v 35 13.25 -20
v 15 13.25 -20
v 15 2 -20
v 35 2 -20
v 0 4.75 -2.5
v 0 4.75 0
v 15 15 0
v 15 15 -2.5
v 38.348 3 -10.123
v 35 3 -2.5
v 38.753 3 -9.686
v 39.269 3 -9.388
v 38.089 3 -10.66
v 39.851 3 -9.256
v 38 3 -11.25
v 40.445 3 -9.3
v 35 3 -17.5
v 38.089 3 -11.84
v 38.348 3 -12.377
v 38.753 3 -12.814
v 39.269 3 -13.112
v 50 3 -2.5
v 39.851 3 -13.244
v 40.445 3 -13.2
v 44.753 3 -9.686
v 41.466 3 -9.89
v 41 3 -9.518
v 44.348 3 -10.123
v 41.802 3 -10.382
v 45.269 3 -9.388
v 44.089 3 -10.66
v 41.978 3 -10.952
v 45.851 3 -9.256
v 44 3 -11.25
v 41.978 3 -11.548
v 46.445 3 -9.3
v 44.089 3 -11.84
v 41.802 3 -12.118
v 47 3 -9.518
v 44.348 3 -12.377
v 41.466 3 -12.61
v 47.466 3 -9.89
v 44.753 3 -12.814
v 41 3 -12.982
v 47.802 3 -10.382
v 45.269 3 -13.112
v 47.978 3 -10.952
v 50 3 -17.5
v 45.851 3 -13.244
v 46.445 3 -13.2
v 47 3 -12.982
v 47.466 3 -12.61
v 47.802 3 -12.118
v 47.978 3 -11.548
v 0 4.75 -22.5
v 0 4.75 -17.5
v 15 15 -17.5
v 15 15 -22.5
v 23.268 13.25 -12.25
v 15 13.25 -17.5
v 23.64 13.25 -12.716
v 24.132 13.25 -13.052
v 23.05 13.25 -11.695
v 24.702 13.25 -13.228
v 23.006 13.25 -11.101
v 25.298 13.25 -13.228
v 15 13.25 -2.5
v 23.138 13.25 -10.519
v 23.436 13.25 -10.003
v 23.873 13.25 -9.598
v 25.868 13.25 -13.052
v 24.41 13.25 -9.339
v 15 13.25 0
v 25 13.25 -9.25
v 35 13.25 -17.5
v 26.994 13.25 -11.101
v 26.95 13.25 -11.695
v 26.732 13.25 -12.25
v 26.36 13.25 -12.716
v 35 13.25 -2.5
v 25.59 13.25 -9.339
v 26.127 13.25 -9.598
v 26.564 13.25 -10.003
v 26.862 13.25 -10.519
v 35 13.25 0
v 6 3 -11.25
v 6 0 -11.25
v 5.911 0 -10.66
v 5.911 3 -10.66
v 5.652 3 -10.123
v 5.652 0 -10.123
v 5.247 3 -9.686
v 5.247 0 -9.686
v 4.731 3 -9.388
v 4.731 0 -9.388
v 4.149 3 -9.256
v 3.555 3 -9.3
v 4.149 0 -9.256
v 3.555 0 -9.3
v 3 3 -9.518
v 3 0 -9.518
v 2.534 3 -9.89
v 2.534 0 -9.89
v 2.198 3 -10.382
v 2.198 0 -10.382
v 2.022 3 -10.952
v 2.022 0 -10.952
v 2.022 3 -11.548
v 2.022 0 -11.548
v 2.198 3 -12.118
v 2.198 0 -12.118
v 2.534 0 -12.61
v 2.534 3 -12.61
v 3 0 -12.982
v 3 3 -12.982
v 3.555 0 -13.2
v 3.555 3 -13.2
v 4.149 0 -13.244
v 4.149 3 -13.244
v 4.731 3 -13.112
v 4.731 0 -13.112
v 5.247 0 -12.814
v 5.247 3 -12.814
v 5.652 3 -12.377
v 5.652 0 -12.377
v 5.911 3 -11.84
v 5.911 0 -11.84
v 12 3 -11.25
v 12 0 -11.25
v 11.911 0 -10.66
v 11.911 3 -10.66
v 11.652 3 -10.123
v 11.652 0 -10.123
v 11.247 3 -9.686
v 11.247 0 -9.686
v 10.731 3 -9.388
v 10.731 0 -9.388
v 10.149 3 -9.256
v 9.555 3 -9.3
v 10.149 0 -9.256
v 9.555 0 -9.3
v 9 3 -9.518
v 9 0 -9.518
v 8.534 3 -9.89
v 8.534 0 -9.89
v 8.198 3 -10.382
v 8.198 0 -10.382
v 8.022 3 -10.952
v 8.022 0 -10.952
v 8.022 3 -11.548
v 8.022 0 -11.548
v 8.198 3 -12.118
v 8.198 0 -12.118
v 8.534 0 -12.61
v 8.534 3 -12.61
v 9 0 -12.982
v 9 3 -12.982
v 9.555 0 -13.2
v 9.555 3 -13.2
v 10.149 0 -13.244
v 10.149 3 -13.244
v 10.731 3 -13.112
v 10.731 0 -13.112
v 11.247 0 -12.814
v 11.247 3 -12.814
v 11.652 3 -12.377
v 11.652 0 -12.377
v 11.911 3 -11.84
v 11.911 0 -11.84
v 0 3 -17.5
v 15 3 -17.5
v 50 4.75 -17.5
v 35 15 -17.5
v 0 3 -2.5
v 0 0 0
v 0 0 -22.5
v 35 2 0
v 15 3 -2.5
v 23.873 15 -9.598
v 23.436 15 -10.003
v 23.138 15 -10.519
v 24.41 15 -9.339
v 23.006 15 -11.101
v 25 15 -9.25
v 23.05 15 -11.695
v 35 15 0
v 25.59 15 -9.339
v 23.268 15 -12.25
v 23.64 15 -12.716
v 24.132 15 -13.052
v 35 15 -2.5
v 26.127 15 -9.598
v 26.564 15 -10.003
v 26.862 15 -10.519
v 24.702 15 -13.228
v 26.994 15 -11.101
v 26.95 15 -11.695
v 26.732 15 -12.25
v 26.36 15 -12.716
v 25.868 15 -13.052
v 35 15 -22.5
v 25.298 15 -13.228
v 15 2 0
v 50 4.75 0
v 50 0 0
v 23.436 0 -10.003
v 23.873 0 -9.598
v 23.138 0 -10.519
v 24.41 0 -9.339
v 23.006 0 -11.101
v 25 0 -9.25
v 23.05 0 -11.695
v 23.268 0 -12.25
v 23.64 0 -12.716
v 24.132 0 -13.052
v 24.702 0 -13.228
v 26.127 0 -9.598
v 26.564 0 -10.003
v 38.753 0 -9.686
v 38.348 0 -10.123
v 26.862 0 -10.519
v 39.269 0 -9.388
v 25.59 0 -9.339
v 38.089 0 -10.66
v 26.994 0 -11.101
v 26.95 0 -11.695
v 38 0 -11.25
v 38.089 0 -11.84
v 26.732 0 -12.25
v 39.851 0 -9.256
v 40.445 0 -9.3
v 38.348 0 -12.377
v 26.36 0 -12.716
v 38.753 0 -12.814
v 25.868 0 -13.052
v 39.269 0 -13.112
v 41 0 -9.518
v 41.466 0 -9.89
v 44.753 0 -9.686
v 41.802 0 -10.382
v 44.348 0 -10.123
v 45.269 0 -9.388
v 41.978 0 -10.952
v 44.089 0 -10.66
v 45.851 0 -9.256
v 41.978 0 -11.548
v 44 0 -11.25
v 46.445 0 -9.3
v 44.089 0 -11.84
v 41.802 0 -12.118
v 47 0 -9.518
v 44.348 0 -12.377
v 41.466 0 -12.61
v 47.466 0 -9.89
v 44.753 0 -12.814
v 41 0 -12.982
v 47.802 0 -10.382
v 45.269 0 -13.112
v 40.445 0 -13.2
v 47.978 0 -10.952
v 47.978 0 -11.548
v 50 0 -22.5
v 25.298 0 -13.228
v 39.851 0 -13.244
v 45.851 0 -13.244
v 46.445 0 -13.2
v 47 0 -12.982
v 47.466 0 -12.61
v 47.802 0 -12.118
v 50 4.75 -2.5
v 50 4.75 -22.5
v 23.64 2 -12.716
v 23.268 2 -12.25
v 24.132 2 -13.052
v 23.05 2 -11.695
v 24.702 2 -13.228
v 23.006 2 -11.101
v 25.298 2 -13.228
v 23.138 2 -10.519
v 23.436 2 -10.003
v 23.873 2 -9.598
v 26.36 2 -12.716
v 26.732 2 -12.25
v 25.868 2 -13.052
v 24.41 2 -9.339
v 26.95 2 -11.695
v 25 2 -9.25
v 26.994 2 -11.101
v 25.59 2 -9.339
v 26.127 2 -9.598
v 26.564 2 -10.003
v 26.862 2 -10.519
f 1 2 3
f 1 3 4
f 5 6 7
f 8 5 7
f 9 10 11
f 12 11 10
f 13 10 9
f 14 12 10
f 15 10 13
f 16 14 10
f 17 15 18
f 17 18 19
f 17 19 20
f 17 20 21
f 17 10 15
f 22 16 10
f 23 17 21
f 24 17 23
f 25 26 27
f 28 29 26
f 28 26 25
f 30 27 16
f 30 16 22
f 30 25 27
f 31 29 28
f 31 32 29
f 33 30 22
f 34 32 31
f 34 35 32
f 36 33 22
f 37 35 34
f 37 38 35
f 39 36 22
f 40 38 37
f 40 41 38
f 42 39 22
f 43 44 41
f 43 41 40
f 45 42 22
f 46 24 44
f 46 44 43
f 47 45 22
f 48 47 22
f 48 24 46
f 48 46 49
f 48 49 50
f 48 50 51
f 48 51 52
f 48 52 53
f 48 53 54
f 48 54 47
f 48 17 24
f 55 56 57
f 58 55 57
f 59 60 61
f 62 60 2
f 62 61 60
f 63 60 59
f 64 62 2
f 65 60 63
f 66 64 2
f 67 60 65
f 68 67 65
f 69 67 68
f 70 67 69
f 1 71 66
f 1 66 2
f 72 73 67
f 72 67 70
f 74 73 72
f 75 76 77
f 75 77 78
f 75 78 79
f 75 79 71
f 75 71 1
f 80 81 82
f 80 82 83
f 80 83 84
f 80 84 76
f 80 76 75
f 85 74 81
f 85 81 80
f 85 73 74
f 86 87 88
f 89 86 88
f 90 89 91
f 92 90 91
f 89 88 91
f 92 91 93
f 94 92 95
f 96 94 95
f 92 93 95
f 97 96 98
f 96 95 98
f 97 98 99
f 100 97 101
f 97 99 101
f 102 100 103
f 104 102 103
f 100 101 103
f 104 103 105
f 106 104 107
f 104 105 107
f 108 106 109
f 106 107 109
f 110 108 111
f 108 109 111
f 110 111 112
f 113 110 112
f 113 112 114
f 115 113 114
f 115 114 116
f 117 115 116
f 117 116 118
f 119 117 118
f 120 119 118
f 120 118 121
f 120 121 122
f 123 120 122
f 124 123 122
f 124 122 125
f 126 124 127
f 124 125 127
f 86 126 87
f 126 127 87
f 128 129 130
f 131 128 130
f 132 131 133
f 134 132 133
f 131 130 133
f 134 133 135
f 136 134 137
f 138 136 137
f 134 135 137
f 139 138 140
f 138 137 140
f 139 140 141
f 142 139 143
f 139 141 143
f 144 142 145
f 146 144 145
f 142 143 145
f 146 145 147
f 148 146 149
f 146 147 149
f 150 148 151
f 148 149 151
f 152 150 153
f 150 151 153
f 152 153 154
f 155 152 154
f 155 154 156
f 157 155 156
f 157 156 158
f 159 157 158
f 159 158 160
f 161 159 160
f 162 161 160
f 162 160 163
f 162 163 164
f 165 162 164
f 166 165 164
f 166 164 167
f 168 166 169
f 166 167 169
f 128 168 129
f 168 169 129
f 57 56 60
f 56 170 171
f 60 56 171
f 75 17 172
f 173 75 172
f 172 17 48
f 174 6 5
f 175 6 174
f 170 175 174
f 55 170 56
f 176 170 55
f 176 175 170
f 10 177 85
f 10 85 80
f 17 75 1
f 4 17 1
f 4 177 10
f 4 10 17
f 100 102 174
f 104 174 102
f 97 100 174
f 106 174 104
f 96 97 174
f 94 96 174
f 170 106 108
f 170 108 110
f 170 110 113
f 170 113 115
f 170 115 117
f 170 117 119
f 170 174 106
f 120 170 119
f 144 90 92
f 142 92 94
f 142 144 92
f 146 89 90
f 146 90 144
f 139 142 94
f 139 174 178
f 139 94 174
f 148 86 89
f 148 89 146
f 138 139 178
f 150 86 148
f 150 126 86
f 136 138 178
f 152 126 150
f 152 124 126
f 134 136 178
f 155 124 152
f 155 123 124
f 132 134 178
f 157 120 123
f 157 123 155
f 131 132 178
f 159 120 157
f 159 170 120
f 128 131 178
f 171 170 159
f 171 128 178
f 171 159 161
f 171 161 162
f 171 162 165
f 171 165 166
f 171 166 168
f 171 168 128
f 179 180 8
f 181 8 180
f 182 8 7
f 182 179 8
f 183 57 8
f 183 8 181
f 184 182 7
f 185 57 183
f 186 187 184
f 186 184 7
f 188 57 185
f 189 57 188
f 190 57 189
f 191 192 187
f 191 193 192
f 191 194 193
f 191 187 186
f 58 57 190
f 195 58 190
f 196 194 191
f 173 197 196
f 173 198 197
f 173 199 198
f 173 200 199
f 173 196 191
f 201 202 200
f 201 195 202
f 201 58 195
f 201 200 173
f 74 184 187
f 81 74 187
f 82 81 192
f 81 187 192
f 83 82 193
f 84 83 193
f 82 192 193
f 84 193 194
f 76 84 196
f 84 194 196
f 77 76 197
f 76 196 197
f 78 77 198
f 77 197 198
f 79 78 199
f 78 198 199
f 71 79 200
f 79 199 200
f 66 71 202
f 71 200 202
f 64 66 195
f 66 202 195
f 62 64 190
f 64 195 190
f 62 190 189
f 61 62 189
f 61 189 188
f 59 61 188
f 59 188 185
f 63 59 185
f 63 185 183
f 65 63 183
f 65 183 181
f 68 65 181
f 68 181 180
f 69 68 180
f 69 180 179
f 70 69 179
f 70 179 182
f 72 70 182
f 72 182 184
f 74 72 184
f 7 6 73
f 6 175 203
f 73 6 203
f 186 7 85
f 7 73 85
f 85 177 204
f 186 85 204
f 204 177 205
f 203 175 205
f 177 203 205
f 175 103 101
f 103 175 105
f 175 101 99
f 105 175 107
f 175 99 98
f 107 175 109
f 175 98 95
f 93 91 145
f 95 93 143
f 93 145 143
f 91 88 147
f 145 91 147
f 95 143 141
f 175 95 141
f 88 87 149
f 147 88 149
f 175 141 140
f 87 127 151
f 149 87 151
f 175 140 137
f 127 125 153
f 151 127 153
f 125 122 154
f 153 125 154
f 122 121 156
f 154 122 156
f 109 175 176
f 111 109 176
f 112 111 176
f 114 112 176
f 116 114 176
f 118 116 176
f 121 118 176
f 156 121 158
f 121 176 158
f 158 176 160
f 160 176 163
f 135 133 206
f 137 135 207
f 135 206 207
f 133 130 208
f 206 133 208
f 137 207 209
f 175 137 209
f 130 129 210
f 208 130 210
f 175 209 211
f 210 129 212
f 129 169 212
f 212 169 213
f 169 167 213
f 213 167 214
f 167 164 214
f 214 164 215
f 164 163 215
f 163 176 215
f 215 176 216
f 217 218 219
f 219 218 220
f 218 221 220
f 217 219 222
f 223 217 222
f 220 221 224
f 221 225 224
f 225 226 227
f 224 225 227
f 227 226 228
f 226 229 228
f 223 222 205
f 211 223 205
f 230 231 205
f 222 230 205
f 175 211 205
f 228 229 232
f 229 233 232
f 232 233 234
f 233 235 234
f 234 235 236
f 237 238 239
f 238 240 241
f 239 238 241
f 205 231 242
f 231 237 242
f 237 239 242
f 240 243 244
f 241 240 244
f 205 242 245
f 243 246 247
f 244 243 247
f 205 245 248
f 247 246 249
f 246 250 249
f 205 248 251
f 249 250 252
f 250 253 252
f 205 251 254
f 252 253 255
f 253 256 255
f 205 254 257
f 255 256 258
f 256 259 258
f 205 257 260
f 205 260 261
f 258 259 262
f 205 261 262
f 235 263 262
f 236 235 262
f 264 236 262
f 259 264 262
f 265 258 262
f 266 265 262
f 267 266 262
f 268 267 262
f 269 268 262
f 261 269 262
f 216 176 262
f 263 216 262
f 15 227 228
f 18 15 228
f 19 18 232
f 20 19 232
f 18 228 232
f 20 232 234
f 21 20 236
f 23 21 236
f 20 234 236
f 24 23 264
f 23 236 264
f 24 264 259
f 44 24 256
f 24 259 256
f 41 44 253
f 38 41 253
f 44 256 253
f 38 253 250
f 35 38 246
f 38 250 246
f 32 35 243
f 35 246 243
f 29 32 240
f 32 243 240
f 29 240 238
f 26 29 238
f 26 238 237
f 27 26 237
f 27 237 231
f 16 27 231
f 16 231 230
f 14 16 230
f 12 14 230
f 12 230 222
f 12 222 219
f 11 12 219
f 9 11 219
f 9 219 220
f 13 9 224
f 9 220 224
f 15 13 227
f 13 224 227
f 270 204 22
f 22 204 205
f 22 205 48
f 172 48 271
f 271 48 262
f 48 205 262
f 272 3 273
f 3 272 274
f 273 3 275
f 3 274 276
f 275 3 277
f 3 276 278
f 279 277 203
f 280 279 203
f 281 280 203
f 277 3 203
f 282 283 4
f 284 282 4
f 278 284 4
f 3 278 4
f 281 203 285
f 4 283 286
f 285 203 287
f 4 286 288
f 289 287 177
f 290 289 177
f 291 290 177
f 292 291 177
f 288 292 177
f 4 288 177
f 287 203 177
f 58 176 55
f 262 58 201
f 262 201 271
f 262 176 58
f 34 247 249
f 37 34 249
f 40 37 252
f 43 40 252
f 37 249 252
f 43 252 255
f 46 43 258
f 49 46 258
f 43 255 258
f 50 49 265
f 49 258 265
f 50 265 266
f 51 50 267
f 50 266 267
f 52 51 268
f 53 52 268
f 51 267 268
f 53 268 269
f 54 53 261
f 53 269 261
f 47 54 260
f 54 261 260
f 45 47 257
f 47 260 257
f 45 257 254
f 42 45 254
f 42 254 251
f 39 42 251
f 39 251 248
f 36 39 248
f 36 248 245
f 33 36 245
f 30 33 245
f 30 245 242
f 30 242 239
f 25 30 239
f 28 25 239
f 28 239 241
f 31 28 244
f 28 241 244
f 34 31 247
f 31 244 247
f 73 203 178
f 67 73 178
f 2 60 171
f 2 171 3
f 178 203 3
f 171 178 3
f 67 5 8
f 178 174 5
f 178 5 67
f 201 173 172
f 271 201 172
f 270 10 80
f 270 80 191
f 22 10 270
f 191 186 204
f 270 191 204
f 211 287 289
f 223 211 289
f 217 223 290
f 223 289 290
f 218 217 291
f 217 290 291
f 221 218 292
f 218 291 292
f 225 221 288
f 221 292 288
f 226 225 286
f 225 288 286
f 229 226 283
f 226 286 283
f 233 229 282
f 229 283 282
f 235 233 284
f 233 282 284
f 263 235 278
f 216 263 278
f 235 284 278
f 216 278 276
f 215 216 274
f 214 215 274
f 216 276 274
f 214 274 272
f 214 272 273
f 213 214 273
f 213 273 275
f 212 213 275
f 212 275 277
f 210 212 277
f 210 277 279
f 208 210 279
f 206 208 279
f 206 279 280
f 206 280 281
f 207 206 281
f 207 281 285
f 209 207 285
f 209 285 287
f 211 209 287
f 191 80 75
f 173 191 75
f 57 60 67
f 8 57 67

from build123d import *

# Parameters (mm, degrees)
SKETCH1_W           = 20
SKETCH1_H           = 11.25
BOSS_EXTRUDE1_DEPTH = 3
SKETCH1_3_W         = 20
SKETCH1_3_H         = 11.25
BOSS_EXTRUDE2_DEPTH = 15
SKETCH2_W           = 20
SKETCH2_H           = 11.25
CUT_EXTRUDE1_DEPTH  = 20
BOSS_EXTRUDE3_REACH = 58.127
SKETCH3_W           = 15
SKETCH3_H           = 5
SKETCH3_H_2         = 2.5
CUT_EXTRUDE2_REACH  = 58.844
SKETCH5_R           = 2
CUT_EXTRUDE3_DEPTH  = 57.844085005


with BuildPart() as part:
    # Sketch1 → Boss-Extrude1 (new body)
    with BuildSketch(Plane(origin=(0, 0, 0), x_dir=(1, 0, 0), z_dir=(0, 1, 0))):
        with BuildLine():
            Line((15, 11.25), (15, 22.5))
            Line((15, 22.5), (0, 22.5))
            Line((0, 22.5), (0, 11.25))
            Line((0, 11.25), (2, 11.25))
            ThreePointArc((2, 11.25), (4, 13.25), (6, 11.25))
            Line((6, 11.25), (8, 11.25))
            ThreePointArc((8, 11.25), (10, 13.25), (12, 11.25))
            Line((12, 11.25), (15, 11.25))
        make_face()
        with BuildLine():
            Line((0, 0), (15, 0))
            Line((15, 0), (15, 11.25))
            Line((15, 11.25), (12, 11.25))
            ThreePointArc((12, 11.25), (10, 9.25), (8, 11.25))
            Line((8, 11.25), (6, 11.25))
            ThreePointArc((6, 11.25), (4, 9.25), (2, 11.25))
            Line((2, 11.25), (0, 11.25))
            Line((0, 11.25), (0, 0))
        make_face()
        with Locations((25, 5.625)):
            Rectangle(SKETCH1_W, SKETCH1_H)
        with Locations((25, 16.875)):
            Rectangle(SKETCH1_W, SKETCH1_H)
        with BuildLine():
            Line((50, 11.25), (48, 11.25))
            ThreePointArc((48, 11.25), (46, 9.25), (44, 11.25))
            Line((44, 11.25), (42, 11.25))
            ThreePointArc((42, 11.25), (40, 9.25), (38, 11.25))
            Line((38, 11.25), (35, 11.25))
            Line((35, 11.25), (35, 0))
            Line((35, 0), (50, 0))
            Line((50, 0), (50, 11.25))
        make_face()
        with BuildLine():
            ThreePointArc((44, 11.25), (46, 13.25), (48, 11.25))
            Line((48, 11.25), (50, 11.25))
            Line((50, 11.25), (50, 22.5))
            Line((50, 22.5), (35, 22.5))
            Line((35, 22.5), (35, 11.25))
            Line((35, 11.25), (38, 11.25))
            ThreePointArc((38, 11.25), (40, 13.25), (42, 11.25))
            Line((42, 11.25), (44, 11.25))
        make_face()
    extrude(amount=BOSS_EXTRUDE1_DEPTH)

    # Sketch1<3> → Boss-Extrude2 (add)
    with BuildSketch(Plane(origin=(0, 0, 0), x_dir=(1, 0, 0), z_dir=(0, 1, 0))):
        with Locations((25, 5.625)):
            Rectangle(SKETCH1_3_W, SKETCH1_3_H)
        with Locations((25, 16.875)):
            Rectangle(SKETCH1_3_W, SKETCH1_3_H)
    extrude(amount=BOSS_EXTRUDE2_DEPTH)

    # Sketch2 → Cut-Extrude1 (cut)
    with BuildSketch(Plane.XY):
        with Locations((25, 7.625)):
            Rectangle(SKETCH2_W, SKETCH2_H)
    extrude(amount=-CUT_EXTRUDE1_DEPTH, mode=Mode.SUBTRACT)

    # Boss-Extrude3: up to this face of the body (flat: up to its plane)
    boss_extrude3_end = Plane(part.part.faces().sort_by_distance((25, 15, -11.25))[0])
    # Sketch3 → Boss-Extrude3 (add, up to the picked face)
    with BuildSketch(Plane(origin=(0, 3, 0), x_dir=(1, 0, 0), z_dir=(0, 1, 0)), mode=Mode.PRIVATE) as boss_extrude3_sk1:
        with Locations((42.5, 20)):
            Rectangle(SKETCH3_W, SKETCH3_H)
    boss_extrude3_tool1 = split(extrude(boss_extrude3_sk1.sketch, amount=BOSS_EXTRUDE3_REACH, mode=Mode.PRIVATE), bisect_by=boss_extrude3_end, keep=Keep.BOTH, mode=Mode.PRIVATE)
    # Sketch3 → Boss-Extrude3 (add, up to the picked face)
    with BuildSketch(Plane(origin=(0, 3, 0), x_dir=(1, 0, 0), z_dir=(0, 1, 0)), mode=Mode.PRIVATE) as boss_extrude3_sk2:
        with Locations((7.5, 20)):
            Rectangle(SKETCH3_W, SKETCH3_H)
    boss_extrude3_tool2 = split(extrude(boss_extrude3_sk2.sketch, amount=BOSS_EXTRUDE3_REACH, mode=Mode.PRIVATE), bisect_by=boss_extrude3_end, keep=Keep.BOTH, mode=Mode.PRIVATE)
    # Sketch3 → Boss-Extrude3 (add, up to the picked face)
    with BuildSketch(Plane(origin=(0, 3, 0), x_dir=(1, 0, 0), z_dir=(0, 1, 0)), mode=Mode.PRIVATE) as boss_extrude3_sk3:
        with Locations((7.5, 1.25)):
            Rectangle(SKETCH3_W, SKETCH3_H_2)
    boss_extrude3_tool3 = split(extrude(boss_extrude3_sk3.sketch, amount=BOSS_EXTRUDE3_REACH, mode=Mode.PRIVATE), bisect_by=boss_extrude3_end, keep=Keep.BOTH, mode=Mode.PRIVATE)
    # Sketch3 → Boss-Extrude3 (add, up to the picked face)
    with BuildSketch(Plane(origin=(0, 3, 0), x_dir=(1, 0, 0), z_dir=(0, 1, 0)), mode=Mode.PRIVATE) as boss_extrude3_sk4:
        with Locations((42.5, 1.25)):
            Rectangle(SKETCH3_W, SKETCH3_H_2)
    boss_extrude3_tool4 = split(extrude(boss_extrude3_sk4.sketch, amount=BOSS_EXTRUDE3_REACH, mode=Mode.PRIVATE), bisect_by=boss_extrude3_end, keep=Keep.BOTH, mode=Mode.PRIVATE)
    add(boss_extrude3_tool1.solids().sort_by(Axis((42.5, 3, -20), (0, 1, 0)))[0])
    add(boss_extrude3_tool2.solids().sort_by(Axis((7.5, 3, -20), (0, 1, 0)))[0])
    add(boss_extrude3_tool3.solids().sort_by(Axis((7.5, 3, -1.25), (0, 1, 0)))[0])
    add(boss_extrude3_tool4.solids().sort_by(Axis((42.5, 3, -1.25), (0, 1, 0)))[0])

    # Cut-Extrude2: up to this face of the body (flat: up to its plane)
    cut_extrude2_end = Plane(part.part.faces().sort_by_distance((25, 7.5, -22.5))[0])
    # Sketch4 → Cut-Extrude2 (cut, up to the picked face)
    with BuildSketch(Plane.XY, mode=Mode.PRIVATE) as cut_extrude2_sk1:
        Polygon((0, 4.75), (15, 15), (0, 15), align=None)
    cut_extrude2_tool1 = split(extrude(cut_extrude2_sk1.sketch, amount=-CUT_EXTRUDE2_REACH, mode=Mode.PRIVATE), bisect_by=cut_extrude2_end, keep=Keep.BOTH, mode=Mode.PRIVATE)
    # Sketch4 → Cut-Extrude2 (cut, up to the picked face)
    with BuildSketch(Plane.XY, mode=Mode.PRIVATE) as cut_extrude2_sk2:
        Polygon((50, 15), (35, 15), (50, 4.75), align=None)
    cut_extrude2_tool2 = split(extrude(cut_extrude2_sk2.sketch, amount=-CUT_EXTRUDE2_REACH, mode=Mode.PRIVATE), bisect_by=cut_extrude2_end, keep=Keep.BOTH, mode=Mode.PRIVATE)
    add(cut_extrude2_tool1.solids().sort_by(Axis((5, 11.583333, 0), (0, 0, -1)))[0], mode=Mode.SUBTRACT)
    add(cut_extrude2_tool2.solids().sort_by(Axis((45, 11.583333, 0), (0, 0, -1)))[0], mode=Mode.SUBTRACT)

    # Sketch5 → Cut-Extrude3 (cut, through all)
    with BuildSketch(Plane(origin=(0, 15, 0), x_dir=(1, 0, 0), z_dir=(0, 1, 0))):
        with Locations(Location((25, 11.25, 0), (0, 0, 270))):
            Circle(SKETCH5_R)
    extrude(amount=-CUT_EXTRUDE3_DEPTH, mode=Mode.SUBTRACT)


solid = part.part
